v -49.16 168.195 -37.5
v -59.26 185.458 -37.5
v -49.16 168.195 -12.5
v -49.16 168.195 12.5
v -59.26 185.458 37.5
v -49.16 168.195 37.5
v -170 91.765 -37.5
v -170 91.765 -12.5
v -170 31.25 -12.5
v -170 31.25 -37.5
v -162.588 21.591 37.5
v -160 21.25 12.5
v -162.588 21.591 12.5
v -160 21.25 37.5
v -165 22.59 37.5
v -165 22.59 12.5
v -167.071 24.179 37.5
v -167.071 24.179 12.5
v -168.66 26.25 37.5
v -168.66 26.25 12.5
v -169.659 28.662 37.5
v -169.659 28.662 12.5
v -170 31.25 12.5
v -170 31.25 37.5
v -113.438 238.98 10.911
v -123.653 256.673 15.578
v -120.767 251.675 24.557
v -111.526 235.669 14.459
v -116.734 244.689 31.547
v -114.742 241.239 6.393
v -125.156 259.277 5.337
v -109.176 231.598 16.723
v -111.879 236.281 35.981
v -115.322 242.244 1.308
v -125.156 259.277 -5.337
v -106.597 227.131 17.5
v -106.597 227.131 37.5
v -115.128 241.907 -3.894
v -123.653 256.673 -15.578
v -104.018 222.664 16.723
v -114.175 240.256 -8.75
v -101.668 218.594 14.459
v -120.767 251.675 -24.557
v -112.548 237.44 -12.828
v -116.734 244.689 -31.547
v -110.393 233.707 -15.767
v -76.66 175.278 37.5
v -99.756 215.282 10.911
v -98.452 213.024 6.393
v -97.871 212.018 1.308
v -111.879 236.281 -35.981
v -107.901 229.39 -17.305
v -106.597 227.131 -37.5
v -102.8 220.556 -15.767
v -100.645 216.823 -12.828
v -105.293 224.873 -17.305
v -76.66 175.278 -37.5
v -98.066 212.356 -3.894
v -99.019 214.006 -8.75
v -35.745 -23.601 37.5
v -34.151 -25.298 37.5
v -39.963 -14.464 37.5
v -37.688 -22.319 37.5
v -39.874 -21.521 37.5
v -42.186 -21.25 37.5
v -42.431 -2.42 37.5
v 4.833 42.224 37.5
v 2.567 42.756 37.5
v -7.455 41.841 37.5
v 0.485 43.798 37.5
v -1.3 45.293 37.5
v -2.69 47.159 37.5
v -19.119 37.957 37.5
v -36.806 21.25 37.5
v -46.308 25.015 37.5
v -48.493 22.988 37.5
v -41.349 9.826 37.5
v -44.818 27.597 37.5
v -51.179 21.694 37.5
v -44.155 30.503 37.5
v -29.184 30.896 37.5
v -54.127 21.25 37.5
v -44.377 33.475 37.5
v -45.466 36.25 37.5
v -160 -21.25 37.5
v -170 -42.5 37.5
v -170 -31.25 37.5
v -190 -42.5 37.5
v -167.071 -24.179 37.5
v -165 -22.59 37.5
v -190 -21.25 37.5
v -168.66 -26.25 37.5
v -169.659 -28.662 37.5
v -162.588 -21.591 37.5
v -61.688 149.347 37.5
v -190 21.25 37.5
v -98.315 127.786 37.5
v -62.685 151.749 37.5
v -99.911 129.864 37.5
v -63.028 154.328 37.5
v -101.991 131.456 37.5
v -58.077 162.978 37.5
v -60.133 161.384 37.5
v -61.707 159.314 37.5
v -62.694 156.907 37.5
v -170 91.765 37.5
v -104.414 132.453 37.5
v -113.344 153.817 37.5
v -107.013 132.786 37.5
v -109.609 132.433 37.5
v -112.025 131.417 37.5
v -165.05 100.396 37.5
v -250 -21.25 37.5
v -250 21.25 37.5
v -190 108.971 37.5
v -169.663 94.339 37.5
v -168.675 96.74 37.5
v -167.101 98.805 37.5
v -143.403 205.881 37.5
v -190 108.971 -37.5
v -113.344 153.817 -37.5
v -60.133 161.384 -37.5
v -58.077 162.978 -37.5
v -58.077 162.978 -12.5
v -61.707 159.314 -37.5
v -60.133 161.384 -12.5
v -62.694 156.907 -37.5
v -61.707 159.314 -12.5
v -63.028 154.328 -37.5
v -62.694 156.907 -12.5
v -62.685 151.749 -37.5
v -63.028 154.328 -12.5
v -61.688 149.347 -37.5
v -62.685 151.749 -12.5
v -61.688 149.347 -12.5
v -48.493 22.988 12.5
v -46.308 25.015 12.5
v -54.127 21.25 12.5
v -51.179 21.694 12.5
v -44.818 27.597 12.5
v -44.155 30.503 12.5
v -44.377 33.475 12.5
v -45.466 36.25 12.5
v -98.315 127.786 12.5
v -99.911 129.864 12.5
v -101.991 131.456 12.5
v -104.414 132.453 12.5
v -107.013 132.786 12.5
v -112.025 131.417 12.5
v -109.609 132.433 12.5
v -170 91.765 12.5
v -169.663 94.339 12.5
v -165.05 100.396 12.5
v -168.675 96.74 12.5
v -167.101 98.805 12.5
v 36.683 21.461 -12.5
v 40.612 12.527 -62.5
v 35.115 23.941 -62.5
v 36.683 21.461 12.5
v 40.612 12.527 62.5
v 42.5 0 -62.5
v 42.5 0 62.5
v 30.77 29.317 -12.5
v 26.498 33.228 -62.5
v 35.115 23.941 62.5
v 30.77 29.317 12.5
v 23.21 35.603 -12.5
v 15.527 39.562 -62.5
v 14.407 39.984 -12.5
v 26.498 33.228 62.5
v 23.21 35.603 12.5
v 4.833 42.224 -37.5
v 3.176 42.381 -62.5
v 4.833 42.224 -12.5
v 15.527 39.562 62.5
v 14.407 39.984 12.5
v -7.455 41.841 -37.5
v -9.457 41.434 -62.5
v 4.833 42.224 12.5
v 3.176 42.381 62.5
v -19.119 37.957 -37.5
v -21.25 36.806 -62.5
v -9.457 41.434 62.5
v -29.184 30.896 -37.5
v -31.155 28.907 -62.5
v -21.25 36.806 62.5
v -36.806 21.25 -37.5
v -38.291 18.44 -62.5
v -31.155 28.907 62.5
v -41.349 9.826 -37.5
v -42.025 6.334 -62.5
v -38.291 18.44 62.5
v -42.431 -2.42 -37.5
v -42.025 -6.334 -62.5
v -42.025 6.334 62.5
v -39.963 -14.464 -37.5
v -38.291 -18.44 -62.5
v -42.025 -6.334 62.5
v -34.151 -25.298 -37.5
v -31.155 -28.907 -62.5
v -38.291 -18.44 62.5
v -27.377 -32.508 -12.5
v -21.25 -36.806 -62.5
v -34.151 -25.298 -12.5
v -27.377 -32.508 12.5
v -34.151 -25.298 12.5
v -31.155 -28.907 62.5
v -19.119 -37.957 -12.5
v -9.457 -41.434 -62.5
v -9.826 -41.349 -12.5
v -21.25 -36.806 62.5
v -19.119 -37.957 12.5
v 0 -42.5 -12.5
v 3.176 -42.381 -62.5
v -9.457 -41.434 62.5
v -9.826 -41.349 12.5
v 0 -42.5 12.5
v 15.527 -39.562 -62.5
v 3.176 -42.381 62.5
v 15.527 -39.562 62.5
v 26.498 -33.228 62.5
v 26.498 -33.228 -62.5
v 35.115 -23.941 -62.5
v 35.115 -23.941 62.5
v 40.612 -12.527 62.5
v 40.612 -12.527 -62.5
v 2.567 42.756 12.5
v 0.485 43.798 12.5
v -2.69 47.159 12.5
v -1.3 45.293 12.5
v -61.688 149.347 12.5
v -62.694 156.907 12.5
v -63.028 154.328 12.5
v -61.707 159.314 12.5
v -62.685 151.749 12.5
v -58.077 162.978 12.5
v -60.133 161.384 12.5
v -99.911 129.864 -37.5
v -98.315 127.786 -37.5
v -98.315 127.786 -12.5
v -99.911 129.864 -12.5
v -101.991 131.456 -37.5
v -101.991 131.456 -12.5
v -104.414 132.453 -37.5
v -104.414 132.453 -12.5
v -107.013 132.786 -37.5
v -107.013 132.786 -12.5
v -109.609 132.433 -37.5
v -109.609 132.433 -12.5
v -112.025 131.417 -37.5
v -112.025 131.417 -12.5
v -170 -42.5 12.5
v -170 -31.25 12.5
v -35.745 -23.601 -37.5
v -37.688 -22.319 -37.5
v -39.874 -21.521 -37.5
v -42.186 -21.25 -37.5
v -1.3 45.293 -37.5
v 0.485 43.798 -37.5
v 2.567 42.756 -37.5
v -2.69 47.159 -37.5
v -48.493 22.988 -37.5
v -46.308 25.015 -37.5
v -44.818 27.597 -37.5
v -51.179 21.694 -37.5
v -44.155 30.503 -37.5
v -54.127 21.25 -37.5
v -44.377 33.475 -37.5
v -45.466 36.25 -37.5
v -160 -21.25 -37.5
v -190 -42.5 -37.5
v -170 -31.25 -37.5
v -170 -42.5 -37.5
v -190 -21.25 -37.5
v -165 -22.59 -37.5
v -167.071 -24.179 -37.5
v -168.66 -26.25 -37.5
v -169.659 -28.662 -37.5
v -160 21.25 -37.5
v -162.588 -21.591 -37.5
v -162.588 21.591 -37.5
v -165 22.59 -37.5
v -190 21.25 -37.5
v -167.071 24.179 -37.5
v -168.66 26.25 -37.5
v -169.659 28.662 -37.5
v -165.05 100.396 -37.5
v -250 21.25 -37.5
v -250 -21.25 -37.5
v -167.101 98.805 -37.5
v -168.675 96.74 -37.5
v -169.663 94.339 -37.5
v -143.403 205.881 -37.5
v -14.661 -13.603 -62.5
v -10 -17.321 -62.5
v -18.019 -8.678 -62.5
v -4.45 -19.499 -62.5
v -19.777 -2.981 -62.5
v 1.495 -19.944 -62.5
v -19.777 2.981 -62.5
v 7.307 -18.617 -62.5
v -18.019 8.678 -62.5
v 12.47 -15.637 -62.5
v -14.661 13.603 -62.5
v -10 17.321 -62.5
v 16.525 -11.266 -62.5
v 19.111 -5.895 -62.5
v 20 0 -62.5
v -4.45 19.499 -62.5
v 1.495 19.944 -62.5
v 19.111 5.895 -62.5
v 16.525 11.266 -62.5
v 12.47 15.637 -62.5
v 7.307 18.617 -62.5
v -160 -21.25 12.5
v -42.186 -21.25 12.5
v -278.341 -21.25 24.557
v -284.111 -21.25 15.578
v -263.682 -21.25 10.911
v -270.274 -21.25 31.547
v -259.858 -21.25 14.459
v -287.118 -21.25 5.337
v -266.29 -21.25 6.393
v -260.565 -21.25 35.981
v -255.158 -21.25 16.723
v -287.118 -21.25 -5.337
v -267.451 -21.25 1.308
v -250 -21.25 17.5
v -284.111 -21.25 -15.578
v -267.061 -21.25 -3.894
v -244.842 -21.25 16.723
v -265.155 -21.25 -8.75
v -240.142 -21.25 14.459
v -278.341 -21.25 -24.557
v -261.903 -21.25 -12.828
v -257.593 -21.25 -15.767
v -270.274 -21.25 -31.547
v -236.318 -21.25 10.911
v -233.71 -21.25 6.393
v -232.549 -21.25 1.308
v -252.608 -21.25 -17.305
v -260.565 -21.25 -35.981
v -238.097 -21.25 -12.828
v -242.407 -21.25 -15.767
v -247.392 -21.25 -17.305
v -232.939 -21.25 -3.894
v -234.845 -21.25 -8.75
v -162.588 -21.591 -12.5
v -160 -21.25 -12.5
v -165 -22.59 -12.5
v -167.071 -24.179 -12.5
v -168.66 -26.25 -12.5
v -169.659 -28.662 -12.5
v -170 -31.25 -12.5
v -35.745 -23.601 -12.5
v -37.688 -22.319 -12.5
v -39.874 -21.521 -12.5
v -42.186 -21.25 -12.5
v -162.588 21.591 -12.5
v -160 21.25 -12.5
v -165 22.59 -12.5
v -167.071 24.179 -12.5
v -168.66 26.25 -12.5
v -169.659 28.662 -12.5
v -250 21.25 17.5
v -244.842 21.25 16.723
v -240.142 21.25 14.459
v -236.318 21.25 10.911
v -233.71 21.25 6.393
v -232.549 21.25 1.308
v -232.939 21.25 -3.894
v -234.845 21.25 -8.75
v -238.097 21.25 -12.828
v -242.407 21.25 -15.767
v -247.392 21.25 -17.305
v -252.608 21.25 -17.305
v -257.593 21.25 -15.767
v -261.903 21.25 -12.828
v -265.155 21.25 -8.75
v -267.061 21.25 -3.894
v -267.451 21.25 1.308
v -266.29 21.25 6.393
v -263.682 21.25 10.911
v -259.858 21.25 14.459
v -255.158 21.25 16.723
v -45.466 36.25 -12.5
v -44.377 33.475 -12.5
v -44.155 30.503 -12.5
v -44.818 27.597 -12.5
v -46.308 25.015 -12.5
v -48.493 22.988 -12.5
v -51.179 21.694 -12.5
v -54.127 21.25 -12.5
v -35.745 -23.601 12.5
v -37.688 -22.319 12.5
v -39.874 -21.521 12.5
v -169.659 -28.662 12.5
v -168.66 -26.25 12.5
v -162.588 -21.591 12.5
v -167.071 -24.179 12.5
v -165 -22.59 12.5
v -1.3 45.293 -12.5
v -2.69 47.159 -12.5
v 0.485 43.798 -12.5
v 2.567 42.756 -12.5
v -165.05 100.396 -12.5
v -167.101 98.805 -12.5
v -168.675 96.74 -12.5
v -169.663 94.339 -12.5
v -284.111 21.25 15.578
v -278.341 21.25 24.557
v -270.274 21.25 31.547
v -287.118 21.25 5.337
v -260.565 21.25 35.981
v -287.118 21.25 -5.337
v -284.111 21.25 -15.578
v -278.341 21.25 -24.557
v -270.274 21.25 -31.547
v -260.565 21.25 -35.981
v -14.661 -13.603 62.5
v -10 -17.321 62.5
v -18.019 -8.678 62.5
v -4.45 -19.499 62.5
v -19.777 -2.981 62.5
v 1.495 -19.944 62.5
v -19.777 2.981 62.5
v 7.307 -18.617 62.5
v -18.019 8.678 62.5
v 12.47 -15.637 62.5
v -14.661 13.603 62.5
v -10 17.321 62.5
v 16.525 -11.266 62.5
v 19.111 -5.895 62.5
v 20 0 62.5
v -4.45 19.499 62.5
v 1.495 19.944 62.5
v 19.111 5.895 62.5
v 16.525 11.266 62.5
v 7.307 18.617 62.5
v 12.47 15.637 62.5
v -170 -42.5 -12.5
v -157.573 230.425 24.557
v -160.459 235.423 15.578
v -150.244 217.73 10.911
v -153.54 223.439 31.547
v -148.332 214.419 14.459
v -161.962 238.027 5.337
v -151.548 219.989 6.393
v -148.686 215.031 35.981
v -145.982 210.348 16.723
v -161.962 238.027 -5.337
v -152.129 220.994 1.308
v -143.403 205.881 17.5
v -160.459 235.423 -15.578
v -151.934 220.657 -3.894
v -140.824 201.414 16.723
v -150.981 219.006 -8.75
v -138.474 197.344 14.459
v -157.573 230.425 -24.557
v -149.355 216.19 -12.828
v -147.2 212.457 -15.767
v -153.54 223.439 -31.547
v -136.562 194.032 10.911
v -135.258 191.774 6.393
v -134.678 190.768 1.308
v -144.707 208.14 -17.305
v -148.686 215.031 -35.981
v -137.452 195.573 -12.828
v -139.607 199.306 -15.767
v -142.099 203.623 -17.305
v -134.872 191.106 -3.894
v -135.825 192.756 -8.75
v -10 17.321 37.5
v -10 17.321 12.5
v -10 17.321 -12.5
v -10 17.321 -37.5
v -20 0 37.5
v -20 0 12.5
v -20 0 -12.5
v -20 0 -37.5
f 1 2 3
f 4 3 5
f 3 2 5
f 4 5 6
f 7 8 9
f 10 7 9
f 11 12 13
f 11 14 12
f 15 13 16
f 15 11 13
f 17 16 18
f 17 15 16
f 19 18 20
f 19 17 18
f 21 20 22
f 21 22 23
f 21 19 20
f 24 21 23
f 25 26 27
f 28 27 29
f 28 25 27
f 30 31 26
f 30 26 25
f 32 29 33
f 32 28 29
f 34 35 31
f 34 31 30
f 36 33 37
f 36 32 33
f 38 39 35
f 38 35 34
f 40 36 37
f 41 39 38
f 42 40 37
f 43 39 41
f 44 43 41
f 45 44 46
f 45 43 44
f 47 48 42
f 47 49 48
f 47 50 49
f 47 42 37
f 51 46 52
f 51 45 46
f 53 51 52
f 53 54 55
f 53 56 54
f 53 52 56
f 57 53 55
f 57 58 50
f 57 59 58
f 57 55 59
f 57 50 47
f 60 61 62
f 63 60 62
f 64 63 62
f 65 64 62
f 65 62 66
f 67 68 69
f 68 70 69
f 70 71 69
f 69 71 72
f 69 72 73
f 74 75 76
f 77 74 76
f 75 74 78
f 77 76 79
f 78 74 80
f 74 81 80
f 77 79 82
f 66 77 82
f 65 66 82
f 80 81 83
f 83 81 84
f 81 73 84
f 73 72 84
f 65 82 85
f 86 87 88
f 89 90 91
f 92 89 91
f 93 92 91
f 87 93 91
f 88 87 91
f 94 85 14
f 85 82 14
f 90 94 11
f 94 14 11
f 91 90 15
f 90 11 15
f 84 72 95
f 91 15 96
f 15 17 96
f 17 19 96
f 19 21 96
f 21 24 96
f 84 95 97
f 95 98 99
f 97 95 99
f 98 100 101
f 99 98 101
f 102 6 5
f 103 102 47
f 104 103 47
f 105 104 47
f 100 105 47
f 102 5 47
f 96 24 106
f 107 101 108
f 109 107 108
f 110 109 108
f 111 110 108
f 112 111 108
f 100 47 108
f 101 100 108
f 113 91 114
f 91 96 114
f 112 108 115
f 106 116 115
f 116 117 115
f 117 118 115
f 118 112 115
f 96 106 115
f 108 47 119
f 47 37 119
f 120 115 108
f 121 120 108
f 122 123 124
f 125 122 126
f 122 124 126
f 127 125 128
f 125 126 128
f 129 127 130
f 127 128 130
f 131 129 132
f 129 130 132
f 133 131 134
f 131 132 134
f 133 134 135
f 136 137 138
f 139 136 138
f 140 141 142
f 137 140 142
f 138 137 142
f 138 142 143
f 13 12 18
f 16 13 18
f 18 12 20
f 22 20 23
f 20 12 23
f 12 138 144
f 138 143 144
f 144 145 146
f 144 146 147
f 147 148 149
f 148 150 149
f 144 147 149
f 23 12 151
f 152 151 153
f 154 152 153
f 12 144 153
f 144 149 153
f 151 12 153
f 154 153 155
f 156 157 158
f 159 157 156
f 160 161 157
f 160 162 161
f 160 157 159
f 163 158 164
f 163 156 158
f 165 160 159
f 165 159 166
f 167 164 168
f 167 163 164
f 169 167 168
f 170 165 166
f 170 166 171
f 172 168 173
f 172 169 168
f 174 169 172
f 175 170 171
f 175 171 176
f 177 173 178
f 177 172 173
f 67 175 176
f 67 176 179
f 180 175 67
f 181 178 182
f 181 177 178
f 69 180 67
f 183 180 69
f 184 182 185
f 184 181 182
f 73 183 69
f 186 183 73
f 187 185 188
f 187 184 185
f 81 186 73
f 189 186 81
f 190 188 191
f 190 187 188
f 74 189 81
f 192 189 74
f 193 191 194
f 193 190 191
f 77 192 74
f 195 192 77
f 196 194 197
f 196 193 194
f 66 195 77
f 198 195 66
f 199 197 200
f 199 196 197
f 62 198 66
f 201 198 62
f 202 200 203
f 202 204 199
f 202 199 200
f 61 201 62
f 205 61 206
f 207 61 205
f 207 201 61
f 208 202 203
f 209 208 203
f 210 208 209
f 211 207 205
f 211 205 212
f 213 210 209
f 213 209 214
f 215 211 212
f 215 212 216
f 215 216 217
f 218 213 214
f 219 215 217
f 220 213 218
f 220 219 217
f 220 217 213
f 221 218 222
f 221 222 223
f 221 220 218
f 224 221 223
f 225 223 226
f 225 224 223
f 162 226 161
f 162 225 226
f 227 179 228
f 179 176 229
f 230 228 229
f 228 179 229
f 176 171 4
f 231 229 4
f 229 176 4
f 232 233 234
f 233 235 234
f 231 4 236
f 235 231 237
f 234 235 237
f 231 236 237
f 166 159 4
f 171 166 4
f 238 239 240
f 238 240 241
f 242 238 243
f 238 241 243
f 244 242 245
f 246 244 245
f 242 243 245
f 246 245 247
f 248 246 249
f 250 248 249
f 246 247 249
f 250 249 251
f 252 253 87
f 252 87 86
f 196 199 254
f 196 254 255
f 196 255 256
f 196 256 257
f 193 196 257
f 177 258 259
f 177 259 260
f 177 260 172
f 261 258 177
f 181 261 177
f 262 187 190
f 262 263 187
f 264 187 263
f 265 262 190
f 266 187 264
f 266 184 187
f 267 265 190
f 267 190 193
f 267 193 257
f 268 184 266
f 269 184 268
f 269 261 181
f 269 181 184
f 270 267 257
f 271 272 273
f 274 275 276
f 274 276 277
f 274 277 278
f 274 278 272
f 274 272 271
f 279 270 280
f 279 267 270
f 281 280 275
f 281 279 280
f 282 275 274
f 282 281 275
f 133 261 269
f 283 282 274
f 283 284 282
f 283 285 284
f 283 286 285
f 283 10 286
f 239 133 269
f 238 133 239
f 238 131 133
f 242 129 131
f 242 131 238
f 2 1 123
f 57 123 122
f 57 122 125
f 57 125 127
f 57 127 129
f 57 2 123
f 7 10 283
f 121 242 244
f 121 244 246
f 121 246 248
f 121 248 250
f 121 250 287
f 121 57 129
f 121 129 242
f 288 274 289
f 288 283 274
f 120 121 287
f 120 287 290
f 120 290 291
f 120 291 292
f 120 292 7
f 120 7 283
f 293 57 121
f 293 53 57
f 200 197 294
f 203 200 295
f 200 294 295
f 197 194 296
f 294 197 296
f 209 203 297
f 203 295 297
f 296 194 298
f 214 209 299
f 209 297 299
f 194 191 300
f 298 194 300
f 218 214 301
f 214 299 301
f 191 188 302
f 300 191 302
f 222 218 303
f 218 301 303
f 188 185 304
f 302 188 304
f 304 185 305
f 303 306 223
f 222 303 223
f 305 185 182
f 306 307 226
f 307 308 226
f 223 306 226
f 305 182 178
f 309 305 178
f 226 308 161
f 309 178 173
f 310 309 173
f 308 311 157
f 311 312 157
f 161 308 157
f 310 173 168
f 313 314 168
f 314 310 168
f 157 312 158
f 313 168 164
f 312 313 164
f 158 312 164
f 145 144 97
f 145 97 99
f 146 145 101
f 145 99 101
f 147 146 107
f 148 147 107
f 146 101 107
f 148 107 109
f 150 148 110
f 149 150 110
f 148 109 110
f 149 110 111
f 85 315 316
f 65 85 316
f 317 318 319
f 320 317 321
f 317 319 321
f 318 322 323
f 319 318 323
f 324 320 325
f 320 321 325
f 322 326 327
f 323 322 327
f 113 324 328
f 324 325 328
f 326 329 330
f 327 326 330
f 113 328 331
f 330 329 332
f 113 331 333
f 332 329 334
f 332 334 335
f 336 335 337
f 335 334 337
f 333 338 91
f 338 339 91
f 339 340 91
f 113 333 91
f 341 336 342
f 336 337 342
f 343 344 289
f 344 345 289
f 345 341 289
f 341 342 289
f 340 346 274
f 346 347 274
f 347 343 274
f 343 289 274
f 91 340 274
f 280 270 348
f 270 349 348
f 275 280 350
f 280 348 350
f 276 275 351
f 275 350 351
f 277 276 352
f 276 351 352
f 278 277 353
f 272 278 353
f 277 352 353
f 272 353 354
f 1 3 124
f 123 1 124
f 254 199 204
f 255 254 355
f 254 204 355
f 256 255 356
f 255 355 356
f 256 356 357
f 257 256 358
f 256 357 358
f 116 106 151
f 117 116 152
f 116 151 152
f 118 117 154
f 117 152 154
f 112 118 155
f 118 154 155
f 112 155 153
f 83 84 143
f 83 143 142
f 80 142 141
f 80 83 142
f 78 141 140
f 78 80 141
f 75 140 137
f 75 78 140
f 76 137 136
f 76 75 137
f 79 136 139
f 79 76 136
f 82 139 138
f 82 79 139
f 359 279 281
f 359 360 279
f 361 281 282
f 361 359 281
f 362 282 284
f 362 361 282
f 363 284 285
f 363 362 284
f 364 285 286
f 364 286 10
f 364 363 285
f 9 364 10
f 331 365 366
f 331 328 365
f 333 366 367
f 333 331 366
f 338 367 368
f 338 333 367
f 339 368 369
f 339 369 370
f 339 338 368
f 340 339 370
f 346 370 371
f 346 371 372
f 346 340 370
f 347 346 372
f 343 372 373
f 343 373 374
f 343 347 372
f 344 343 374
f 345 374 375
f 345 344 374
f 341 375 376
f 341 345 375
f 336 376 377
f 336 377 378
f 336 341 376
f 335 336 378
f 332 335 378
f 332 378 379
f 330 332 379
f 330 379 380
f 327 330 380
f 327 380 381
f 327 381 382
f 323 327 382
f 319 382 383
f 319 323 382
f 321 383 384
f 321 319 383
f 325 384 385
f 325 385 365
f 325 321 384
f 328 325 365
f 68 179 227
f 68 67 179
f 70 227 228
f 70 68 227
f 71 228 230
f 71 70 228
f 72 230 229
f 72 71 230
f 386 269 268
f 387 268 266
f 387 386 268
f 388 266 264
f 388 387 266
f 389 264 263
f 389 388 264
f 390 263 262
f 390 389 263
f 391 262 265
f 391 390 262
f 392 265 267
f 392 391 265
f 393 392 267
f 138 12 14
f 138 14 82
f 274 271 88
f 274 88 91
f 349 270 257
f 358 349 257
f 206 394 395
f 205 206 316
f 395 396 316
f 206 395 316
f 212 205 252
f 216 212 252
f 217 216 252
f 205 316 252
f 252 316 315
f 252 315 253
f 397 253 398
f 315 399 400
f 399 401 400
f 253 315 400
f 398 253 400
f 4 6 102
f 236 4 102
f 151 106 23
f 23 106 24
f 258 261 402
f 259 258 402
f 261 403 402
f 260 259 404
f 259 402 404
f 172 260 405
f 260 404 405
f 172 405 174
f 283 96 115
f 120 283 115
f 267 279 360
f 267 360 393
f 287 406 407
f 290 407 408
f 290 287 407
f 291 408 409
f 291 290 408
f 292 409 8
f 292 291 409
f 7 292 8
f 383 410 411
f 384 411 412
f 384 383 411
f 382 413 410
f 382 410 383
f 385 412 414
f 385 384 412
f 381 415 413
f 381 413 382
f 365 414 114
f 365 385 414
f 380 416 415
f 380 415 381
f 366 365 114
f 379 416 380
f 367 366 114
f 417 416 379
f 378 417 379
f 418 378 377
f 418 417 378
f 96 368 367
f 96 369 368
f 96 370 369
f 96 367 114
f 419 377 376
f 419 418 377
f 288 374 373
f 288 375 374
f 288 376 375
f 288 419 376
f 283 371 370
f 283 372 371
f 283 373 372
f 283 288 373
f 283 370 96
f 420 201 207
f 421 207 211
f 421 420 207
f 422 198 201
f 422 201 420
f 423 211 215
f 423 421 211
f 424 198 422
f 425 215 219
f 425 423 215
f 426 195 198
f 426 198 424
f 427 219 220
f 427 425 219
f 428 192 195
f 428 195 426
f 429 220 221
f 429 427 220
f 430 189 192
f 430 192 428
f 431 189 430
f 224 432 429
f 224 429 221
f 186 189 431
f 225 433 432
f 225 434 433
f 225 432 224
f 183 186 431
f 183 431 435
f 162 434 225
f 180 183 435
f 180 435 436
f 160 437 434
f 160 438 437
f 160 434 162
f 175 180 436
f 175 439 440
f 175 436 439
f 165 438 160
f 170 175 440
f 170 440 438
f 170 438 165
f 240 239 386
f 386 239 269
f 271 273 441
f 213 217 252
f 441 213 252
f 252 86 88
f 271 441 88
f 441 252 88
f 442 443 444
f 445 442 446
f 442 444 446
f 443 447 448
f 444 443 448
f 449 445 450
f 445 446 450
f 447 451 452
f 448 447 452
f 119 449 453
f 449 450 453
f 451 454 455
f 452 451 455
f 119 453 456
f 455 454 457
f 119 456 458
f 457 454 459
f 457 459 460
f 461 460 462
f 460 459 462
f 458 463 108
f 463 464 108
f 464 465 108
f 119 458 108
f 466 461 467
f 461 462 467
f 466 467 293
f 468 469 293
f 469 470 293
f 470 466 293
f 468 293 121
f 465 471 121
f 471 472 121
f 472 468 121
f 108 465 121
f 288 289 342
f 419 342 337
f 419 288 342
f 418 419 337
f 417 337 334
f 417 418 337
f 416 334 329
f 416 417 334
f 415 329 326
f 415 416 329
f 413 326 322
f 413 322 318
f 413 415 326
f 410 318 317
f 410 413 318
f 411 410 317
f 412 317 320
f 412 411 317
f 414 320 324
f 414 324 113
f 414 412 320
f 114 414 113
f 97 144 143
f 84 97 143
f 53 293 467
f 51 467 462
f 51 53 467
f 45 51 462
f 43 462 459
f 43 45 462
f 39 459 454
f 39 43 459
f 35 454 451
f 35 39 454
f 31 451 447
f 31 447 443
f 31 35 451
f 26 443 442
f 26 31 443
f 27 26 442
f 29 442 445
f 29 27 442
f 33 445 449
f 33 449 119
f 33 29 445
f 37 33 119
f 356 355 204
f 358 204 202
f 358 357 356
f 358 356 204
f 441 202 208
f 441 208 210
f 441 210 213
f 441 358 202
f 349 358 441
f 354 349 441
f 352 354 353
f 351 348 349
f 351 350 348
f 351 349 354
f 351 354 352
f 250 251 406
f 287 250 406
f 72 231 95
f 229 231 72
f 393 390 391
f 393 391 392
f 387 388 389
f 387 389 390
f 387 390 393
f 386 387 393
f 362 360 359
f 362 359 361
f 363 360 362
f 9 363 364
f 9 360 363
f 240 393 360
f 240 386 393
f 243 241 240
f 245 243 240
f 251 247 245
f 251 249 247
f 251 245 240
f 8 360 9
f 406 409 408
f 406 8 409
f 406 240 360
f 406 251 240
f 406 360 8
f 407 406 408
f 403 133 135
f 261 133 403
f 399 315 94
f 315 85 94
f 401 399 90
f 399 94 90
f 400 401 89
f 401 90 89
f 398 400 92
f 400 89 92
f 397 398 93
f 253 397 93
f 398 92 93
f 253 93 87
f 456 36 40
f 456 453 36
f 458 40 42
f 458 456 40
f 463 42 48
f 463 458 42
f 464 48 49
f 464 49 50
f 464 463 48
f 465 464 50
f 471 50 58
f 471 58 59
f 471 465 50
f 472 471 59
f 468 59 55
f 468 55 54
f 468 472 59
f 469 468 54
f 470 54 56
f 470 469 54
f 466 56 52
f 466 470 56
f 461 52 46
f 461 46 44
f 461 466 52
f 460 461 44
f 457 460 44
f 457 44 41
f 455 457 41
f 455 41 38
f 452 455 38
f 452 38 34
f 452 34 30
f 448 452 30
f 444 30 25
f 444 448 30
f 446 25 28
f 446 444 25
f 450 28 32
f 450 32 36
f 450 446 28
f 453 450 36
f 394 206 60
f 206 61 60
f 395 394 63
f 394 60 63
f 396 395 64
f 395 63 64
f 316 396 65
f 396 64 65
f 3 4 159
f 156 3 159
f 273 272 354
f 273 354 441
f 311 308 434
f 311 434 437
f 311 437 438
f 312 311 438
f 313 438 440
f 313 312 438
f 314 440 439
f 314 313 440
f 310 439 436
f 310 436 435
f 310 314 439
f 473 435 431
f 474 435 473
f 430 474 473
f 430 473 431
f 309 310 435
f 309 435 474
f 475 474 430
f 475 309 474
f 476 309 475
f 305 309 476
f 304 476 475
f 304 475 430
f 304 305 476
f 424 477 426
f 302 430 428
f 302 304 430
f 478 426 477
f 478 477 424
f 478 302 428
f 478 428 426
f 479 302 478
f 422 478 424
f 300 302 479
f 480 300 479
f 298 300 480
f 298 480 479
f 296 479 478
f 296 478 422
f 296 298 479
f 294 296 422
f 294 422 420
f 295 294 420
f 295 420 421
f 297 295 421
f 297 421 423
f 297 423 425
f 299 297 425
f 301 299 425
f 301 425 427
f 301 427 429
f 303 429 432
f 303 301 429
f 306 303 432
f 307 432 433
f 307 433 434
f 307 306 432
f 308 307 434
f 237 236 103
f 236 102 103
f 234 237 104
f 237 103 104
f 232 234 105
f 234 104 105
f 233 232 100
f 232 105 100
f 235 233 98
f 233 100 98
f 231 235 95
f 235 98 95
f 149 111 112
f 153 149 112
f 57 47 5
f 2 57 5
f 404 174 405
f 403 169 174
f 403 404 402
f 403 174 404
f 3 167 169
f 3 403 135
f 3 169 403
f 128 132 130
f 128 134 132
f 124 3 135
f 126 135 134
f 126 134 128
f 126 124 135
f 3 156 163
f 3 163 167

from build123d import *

# Parameters (mm, degrees)
SKETCH1_R           = 42.5
SKETCH1_R_2         = 20
BOSS_EXTRUDE1_DEPTH = 62.5
SKETCH2_R           = 17.5
BOSS_EXTRUDE2_DEPTH = 21.25
CIRPATTERN1_COUNT   = 2
CIRPATTERN1_ANGLE   = 300
SKETCH3_R           = 20
BOSS_EXTRUDE3_DEPTH = 12.5
BOSS_EXTRUDE4_DEPTH = 37.5
FILLET1_R           = 10


with BuildPart() as part:
    # Sketch1 → Boss-Extrude1 (new, symmetric)
    with BuildSketch(Plane.XY):
        Circle(SKETCH1_R)
        Circle(SKETCH1_R_2, mode=Mode.SUBTRACT)
    extrude(amount=BOSS_EXTRUDE1_DEPTH, both=True)

    # Sketch2 → Boss-Extrude2 (add, symmetric)
    with BuildSketch(Plane(origin=(0, 0, 0), x_dir=(1, 0, 0), z_dir=(0, 1, 0))):
        with BuildLine():
            Line((-20, -37.5), (-20, 37.5))
            Line((-20, 37.5), (-250, 37.5))
            ThreePointArc((-250, 37.5), (-287.5, 0), (-250, -37.5))
            Line((-250, -37.5), (-20, -37.5))
        make_face()
        with Locations(Location((-250, 0, 0), (0, 0, 270))):
            Circle(SKETCH2_R, mode=Mode.SUBTRACT)
    boss_extrude2 = extrude(amount=BOSS_EXTRUDE2_DEPTH, both=True)

    # CirPattern1: Boss-Extrude2 ×2 about axis
    cirpattern1_axis = Axis((0, 0, 62.5), (0, 0, 1))
    for i in range(1, CIRPATTERN1_COUNT):
        add(boss_extrude2.rotate(cirpattern1_axis, i * CIRPATTERN1_ANGLE / (CIRPATTERN1_COUNT - 1)))

    # Sketch3 → Boss-Extrude3 (add, symmetric)
    with BuildSketch(Plane.XY):
        with BuildLine():
            Line((0, -42.5), (-170, -42.5))
            Line((-170, -42.5), (-170, 97.5))
            Line((-170, 97.5), (-49.160292921, 168.194873881))
            Line((-49.160292921, 168.194873881), (36.683482506, 21.460943857))
            ThreePointArc((36.683482506, 21.460943857), (36.866923617, -21.144265015), (0, -42.5))
        make_face()
        Circle(SKETCH3_R, mode=Mode.SUBTRACT)
    extrude(amount=BOSS_EXTRUDE3_DEPTH, both=True)

    # Sketch4 → Boss-Extrude4 (add, symmetric)
    with BuildSketch(Plane.XY):
        Polygon((-49.160292921, 168.194873881), (-170, 97.5), (-170, -42.5), (-190, -42.5), (-190, 108.970588235), (-59.259560618, 185.457689178), align=None)
    extrude(amount=BOSS_EXTRUDE4_DEPTH, both=True)

    # Fillet1
    fillet1_edges = [part.edges().sort_by_distance(p)[0] for p in [
        (-36.806079661, -21.25, -25),
        (-36.806079661, 21.25, -25),
        (-66.659357171, 157.95739342, -25),
        (-66.659357171, 157.95739342, 25),
        (-103.343444163, 136.49609592, -25),
        (-170, 97.5, -25),
        (-103.343444163, 136.49609592, 25),
        (-170, 97.5, 25),
        (-170, 21.25, -25),
        (-170, 21.25, 25),
        (-170, -21.25, -25),
        (-170, -21.25, 25),
        (0, 42.5, -25),
        (-36.806079661, 21.25, 25),
        (0, 42.5, 25),
        (-36.806079661, -21.25, 25),
    ]]
    fillet(fillet1_edges, radius=FILLET1_R)


solid = part.part
